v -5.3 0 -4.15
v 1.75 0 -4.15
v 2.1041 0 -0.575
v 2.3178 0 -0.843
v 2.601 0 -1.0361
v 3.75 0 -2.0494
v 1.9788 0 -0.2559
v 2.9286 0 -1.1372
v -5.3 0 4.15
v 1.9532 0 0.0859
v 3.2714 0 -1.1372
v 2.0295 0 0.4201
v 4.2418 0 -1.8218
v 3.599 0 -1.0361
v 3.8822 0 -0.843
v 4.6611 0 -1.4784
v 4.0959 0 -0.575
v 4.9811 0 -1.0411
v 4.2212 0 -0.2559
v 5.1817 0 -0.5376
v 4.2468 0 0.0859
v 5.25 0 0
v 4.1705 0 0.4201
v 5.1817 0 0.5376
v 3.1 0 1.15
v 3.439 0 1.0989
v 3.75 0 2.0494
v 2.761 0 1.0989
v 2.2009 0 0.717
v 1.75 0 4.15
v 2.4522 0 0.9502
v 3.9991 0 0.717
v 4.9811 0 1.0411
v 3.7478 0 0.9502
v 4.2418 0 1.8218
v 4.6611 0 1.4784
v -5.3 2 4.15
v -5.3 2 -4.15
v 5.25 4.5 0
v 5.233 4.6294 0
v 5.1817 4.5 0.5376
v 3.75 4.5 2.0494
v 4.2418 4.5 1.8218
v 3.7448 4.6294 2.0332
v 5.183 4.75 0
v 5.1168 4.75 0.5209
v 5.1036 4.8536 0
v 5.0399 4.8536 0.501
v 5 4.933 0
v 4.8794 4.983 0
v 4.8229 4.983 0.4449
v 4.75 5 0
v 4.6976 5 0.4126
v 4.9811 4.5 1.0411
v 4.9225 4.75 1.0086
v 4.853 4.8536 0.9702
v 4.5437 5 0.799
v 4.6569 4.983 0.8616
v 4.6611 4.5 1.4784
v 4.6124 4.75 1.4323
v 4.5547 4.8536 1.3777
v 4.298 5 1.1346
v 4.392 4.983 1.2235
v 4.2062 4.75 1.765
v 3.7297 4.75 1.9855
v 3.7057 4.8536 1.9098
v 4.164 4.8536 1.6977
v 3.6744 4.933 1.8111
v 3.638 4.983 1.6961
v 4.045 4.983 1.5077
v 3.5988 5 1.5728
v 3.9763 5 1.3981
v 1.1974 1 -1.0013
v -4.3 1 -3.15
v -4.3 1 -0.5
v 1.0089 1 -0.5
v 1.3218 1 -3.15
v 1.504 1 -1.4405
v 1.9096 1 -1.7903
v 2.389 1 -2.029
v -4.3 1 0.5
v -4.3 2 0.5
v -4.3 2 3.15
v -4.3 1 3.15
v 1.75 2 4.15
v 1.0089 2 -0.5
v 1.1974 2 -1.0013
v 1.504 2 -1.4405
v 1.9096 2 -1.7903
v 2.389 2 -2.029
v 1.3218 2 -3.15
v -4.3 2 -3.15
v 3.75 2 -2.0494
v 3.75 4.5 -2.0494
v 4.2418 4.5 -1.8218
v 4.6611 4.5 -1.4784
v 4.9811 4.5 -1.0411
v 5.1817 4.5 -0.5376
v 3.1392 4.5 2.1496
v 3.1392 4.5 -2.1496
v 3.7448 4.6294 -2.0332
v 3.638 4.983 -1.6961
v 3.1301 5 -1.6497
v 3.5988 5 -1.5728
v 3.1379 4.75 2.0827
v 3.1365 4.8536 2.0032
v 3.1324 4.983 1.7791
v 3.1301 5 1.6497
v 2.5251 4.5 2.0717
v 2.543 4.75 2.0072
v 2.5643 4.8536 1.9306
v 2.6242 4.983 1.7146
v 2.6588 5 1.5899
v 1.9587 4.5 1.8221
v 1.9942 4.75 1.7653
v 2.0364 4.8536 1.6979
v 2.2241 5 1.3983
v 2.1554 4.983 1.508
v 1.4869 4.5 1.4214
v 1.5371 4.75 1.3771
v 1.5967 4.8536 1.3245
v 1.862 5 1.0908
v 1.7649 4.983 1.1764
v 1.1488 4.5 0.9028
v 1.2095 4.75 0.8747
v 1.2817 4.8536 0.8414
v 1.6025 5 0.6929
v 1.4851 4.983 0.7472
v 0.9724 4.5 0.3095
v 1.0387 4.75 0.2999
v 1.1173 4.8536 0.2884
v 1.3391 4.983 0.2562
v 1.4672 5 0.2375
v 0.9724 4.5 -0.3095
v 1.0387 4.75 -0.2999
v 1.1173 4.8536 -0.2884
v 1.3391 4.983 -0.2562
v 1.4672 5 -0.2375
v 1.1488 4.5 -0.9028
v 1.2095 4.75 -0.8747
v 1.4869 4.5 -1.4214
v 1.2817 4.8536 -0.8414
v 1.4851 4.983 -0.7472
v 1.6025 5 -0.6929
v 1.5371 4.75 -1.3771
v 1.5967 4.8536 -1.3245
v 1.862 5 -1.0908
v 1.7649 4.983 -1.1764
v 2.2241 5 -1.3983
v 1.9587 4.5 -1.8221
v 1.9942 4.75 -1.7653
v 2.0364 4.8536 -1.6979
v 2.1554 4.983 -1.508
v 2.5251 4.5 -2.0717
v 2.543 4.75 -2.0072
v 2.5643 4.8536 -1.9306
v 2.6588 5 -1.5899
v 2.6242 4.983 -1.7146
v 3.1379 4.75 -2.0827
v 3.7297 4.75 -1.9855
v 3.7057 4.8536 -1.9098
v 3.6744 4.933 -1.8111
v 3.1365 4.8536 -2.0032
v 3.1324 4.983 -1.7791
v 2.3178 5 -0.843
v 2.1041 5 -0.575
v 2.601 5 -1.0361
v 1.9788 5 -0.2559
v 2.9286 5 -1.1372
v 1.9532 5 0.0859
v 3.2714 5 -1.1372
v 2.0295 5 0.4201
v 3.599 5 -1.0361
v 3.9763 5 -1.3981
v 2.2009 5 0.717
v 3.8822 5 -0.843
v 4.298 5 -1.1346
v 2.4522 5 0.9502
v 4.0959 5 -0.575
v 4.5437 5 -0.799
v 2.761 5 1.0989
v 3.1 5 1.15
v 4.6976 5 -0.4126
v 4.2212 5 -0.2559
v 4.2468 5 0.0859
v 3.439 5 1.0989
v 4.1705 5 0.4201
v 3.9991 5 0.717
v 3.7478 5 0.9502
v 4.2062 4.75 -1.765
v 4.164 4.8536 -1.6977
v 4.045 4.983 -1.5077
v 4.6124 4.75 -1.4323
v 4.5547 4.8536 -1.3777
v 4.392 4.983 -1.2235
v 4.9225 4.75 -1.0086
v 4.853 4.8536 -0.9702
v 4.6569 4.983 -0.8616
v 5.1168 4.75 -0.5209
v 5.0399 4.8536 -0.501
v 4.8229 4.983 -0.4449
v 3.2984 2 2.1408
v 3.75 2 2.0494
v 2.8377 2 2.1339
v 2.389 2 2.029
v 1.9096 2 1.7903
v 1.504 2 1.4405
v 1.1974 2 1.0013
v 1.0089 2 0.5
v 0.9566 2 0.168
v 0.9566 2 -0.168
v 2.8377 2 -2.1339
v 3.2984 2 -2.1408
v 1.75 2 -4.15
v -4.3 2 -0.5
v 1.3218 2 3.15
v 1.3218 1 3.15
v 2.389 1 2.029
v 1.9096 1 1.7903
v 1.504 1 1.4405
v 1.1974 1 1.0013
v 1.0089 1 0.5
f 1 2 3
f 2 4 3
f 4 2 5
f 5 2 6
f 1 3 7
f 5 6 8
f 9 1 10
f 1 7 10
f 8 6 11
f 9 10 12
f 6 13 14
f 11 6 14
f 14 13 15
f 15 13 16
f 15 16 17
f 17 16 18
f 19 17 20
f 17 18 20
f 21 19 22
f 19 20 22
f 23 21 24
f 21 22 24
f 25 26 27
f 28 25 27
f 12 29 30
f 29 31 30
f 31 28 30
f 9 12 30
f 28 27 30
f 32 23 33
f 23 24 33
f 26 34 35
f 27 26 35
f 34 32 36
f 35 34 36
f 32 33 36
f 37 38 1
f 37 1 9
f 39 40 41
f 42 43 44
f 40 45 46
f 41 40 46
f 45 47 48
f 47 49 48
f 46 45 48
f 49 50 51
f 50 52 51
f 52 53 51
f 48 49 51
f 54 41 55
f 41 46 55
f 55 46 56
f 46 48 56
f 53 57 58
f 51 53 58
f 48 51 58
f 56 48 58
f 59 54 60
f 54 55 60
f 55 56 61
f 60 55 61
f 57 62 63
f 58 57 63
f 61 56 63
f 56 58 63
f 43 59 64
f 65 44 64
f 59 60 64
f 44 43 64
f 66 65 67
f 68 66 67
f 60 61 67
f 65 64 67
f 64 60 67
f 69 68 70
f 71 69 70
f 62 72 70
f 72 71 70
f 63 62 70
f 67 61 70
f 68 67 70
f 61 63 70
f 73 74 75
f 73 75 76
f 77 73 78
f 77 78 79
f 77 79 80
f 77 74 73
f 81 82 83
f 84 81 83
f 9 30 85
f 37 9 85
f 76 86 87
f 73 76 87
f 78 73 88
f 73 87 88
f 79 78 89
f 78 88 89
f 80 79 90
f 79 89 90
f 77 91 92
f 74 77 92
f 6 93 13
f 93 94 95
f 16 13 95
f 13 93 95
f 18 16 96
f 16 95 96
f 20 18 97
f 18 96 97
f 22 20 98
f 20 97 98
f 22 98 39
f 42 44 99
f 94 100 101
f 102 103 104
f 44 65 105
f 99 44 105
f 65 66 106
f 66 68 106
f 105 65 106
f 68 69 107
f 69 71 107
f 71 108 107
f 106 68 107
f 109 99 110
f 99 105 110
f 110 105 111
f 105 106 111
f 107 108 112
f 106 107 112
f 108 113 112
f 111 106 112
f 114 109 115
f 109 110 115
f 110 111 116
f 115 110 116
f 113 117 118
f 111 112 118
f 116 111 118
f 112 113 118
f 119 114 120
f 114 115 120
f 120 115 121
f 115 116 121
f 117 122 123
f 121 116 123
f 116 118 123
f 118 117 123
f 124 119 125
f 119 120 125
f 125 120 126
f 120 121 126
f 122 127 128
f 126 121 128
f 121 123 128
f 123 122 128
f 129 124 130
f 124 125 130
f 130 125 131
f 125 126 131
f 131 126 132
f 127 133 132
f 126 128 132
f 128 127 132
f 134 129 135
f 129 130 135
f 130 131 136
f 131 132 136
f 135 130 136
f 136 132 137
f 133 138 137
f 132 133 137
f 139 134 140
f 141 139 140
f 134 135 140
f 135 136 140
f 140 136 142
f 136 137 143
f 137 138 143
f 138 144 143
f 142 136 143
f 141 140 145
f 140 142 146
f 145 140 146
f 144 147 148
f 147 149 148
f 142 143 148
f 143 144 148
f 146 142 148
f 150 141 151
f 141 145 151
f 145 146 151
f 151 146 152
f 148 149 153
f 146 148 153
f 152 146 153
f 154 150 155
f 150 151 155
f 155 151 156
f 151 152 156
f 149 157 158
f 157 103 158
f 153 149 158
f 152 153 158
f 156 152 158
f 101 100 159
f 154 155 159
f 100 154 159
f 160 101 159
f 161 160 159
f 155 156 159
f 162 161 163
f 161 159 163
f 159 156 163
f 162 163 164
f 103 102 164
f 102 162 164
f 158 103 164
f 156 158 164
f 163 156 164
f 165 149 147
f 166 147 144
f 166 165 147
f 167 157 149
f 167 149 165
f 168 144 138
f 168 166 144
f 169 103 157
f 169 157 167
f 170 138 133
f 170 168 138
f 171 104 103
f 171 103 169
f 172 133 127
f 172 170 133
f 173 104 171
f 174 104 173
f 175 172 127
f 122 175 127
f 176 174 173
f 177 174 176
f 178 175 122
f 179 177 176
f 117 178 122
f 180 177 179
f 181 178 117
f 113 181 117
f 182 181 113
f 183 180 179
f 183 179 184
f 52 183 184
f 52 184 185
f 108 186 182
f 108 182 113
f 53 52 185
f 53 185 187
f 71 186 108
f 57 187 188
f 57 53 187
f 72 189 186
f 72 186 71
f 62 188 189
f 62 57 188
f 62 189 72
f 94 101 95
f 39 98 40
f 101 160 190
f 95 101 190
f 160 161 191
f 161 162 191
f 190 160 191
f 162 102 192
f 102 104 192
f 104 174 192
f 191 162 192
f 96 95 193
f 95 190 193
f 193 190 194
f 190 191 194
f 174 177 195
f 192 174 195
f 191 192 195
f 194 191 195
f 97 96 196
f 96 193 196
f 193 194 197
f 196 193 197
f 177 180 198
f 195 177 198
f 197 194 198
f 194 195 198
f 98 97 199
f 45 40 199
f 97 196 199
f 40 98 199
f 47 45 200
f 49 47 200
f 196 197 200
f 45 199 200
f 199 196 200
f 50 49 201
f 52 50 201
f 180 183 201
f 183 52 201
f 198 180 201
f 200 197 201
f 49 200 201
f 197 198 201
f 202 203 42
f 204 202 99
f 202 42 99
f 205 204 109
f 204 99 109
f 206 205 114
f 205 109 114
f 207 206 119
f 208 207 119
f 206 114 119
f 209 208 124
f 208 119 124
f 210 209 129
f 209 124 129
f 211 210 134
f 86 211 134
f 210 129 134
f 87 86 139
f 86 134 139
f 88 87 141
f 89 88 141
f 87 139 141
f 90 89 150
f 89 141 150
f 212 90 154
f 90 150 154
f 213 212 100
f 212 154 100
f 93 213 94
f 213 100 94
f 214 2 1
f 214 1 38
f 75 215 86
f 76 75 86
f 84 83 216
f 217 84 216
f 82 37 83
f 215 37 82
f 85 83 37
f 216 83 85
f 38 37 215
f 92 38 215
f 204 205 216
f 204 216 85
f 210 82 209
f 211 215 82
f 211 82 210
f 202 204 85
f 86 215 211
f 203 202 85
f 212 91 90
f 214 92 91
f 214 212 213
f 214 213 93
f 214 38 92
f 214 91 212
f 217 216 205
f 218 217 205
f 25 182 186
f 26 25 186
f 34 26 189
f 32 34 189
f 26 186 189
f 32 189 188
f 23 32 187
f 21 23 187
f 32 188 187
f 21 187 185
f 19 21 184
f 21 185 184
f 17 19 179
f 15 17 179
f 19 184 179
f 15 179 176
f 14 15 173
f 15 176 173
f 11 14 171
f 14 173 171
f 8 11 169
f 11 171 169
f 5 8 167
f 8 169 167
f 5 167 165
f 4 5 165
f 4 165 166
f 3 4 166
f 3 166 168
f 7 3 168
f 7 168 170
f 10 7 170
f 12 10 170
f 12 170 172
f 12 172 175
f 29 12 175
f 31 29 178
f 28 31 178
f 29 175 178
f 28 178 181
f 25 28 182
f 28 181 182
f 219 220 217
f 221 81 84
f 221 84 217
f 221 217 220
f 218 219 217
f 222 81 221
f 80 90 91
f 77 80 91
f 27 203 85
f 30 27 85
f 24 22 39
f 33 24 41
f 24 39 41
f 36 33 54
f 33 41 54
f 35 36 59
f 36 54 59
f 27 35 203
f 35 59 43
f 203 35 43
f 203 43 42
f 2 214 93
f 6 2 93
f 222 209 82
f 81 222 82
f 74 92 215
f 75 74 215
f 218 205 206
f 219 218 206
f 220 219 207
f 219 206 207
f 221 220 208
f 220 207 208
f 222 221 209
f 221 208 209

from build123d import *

# Parameters (mm, degrees)
SKETCH1_W           = 10.5
SKETCH1_H           = 8.3
BOSS_EXTRUDE1_DEPTH = 5
CUT_EXTRUDE1_DEPTH  = 10
SKETCH3_W           = 8.3
SKETCH3_H           = 5
BOSS_EXTRUDE2_DEPTH = 0.05
CUT_EXTRUDE2_DEPTH  = 3
SKETCH5_R           = 1.15
CUT_EXTRUDE3_DEPTH  = 5
CUT_EXTRUDE4_DEPTH  = 1
FILLET1_R           = 0.5


with BuildPart() as part:
    # Sketch1 → Boss-Extrude1 (new body)
    with BuildSketch(Plane(origin=(0, 0, 0), x_dir=(1, 0, 0), z_dir=(0, 1, 0))):
        Rectangle(SKETCH1_W, SKETCH1_H)
    extrude(amount=BOSS_EXTRUDE1_DEPTH)

    # Sketch2 → Cut-Extrude1 (cut)
    with BuildSketch(Plane(origin=(0, 5, 0), x_dir=(1, 0, 0), z_dir=(0, 1, 0))):
        with BuildLine():
            Line((1.75, 4.15), (3.75, 2.049390153))
            ThreePointArc((3.75, 2.049390153), (4.834935157, 1.26984251), (5.25, 0))
            Line((5.25, 0), (5.25, 4.15))
            Line((5.25, 4.15), (1.75, 4.15))
        make_face()
        with BuildLine():
            Line((3.75, -2.049390153), (1.75, -4.15))
            Line((1.75, -4.15), (3.75, -4.15))
            Line((3.75, -4.15), (5.25, -4.15))
            Line((5.25, -4.15), (5.25, 0))
            ThreePointArc((5.25, 0), (4.834935157, -1.26984251), (3.75, -2.049390153))
        make_face()
    extrude(amount=-CUT_EXTRUDE1_DEPTH, mode=Mode.SUBTRACT)

    # Sketch3 → Boss-Extrude2 (add)
    with BuildSketch(Plane.ZY.offset(5.25)):
        with Locations((0, 2.5)):
            Rectangle(SKETCH3_W, SKETCH3_H)
    extrude(amount=BOSS_EXTRUDE2_DEPTH)

    # Sketch4 → Cut-Extrude2 (cut)
    with BuildSketch(Plane(origin=(0, 5, 0), x_dir=(1, 0, 0), z_dir=(0, 1, 0))):
        with BuildLine():
            ThreePointArc((3.75, -2.049390153), (0.95, 0), (3.75, 2.049390153))
            Line((3.75, 2.049390153), (1.75, 4.15))
            Line((1.75, 4.15), (-5.3, 4.15))
            Line((-5.3, 4.15), (-5.3, -4.15))
            Line((-5.3, -4.15), (1.75, -4.15))
            Line((1.75, -4.15), (3.75, -2.049390153))
        make_face()
    extrude(amount=-CUT_EXTRUDE2_DEPTH, mode=Mode.SUBTRACT)

    # Sketch5 → Cut-Extrude3 (cut)
    with BuildSketch(Plane(origin=(0, 5, 0), x_dir=(1, 0, 0), z_dir=(0, 1, 0))):
        with Locations(Location((3.1, 0, 0), (0, 0, 270))):
            Circle(SKETCH5_R)
    extrude(amount=-CUT_EXTRUDE3_DEPTH, mode=Mode.SUBTRACT)

    # Sketch6 → Cut-Extrude4 (cut)
    with BuildSketch(Plane(origin=(0, 2, 0), x_dir=(1, 0, 0), z_dir=(0, 1, 0))):
        with BuildLine():
            Line((1.321758158, 3.15), (-4.3, 3.15))
            Line((-4.3, 3.15), (-4.3, 0.5))
            Line((-4.3, 0.5), (-1.21237994, 0.5))
            Line((-1.21237994, 0.5), (1.008947633, 0.5))
            ThreePointArc((1.008947633, 0.5), (1.503963979, 1.440544696), (2.389026153, 2.029043171))
            Line((2.389026153, 2.029043171), (1.321758158, 3.15))
        make_face()
        with BuildLine():
            Line((-1.21237994, -0.5), (-4.3, -0.5))
            Line((-4.3, -0.5), (-4.3, -3.15))
            Line((-4.3, -3.15), (1.321758158, -3.15))
            Line((1.321758158, -3.15), (2.389026153, -2.029043171))
            ThreePointArc((2.389026153, -2.029043171), (1.503963979, -1.440544696), (1.008947633, -0.5))
            Line((1.008947633, -0.5), (-1.21237994, -0.5))
        make_face()
    extrude(amount=-CUT_EXTRUDE4_DEPTH, mode=Mode.SUBTRACT)

    # Fillet1
    fillet1_edges = [part.edges().sort_by_distance(p)[0] for p in [
        (2.45, 5, 2.049390153),
    ]]
    fillet(fillet1_edges, radius=FILLET1_R)


solid = part.part
